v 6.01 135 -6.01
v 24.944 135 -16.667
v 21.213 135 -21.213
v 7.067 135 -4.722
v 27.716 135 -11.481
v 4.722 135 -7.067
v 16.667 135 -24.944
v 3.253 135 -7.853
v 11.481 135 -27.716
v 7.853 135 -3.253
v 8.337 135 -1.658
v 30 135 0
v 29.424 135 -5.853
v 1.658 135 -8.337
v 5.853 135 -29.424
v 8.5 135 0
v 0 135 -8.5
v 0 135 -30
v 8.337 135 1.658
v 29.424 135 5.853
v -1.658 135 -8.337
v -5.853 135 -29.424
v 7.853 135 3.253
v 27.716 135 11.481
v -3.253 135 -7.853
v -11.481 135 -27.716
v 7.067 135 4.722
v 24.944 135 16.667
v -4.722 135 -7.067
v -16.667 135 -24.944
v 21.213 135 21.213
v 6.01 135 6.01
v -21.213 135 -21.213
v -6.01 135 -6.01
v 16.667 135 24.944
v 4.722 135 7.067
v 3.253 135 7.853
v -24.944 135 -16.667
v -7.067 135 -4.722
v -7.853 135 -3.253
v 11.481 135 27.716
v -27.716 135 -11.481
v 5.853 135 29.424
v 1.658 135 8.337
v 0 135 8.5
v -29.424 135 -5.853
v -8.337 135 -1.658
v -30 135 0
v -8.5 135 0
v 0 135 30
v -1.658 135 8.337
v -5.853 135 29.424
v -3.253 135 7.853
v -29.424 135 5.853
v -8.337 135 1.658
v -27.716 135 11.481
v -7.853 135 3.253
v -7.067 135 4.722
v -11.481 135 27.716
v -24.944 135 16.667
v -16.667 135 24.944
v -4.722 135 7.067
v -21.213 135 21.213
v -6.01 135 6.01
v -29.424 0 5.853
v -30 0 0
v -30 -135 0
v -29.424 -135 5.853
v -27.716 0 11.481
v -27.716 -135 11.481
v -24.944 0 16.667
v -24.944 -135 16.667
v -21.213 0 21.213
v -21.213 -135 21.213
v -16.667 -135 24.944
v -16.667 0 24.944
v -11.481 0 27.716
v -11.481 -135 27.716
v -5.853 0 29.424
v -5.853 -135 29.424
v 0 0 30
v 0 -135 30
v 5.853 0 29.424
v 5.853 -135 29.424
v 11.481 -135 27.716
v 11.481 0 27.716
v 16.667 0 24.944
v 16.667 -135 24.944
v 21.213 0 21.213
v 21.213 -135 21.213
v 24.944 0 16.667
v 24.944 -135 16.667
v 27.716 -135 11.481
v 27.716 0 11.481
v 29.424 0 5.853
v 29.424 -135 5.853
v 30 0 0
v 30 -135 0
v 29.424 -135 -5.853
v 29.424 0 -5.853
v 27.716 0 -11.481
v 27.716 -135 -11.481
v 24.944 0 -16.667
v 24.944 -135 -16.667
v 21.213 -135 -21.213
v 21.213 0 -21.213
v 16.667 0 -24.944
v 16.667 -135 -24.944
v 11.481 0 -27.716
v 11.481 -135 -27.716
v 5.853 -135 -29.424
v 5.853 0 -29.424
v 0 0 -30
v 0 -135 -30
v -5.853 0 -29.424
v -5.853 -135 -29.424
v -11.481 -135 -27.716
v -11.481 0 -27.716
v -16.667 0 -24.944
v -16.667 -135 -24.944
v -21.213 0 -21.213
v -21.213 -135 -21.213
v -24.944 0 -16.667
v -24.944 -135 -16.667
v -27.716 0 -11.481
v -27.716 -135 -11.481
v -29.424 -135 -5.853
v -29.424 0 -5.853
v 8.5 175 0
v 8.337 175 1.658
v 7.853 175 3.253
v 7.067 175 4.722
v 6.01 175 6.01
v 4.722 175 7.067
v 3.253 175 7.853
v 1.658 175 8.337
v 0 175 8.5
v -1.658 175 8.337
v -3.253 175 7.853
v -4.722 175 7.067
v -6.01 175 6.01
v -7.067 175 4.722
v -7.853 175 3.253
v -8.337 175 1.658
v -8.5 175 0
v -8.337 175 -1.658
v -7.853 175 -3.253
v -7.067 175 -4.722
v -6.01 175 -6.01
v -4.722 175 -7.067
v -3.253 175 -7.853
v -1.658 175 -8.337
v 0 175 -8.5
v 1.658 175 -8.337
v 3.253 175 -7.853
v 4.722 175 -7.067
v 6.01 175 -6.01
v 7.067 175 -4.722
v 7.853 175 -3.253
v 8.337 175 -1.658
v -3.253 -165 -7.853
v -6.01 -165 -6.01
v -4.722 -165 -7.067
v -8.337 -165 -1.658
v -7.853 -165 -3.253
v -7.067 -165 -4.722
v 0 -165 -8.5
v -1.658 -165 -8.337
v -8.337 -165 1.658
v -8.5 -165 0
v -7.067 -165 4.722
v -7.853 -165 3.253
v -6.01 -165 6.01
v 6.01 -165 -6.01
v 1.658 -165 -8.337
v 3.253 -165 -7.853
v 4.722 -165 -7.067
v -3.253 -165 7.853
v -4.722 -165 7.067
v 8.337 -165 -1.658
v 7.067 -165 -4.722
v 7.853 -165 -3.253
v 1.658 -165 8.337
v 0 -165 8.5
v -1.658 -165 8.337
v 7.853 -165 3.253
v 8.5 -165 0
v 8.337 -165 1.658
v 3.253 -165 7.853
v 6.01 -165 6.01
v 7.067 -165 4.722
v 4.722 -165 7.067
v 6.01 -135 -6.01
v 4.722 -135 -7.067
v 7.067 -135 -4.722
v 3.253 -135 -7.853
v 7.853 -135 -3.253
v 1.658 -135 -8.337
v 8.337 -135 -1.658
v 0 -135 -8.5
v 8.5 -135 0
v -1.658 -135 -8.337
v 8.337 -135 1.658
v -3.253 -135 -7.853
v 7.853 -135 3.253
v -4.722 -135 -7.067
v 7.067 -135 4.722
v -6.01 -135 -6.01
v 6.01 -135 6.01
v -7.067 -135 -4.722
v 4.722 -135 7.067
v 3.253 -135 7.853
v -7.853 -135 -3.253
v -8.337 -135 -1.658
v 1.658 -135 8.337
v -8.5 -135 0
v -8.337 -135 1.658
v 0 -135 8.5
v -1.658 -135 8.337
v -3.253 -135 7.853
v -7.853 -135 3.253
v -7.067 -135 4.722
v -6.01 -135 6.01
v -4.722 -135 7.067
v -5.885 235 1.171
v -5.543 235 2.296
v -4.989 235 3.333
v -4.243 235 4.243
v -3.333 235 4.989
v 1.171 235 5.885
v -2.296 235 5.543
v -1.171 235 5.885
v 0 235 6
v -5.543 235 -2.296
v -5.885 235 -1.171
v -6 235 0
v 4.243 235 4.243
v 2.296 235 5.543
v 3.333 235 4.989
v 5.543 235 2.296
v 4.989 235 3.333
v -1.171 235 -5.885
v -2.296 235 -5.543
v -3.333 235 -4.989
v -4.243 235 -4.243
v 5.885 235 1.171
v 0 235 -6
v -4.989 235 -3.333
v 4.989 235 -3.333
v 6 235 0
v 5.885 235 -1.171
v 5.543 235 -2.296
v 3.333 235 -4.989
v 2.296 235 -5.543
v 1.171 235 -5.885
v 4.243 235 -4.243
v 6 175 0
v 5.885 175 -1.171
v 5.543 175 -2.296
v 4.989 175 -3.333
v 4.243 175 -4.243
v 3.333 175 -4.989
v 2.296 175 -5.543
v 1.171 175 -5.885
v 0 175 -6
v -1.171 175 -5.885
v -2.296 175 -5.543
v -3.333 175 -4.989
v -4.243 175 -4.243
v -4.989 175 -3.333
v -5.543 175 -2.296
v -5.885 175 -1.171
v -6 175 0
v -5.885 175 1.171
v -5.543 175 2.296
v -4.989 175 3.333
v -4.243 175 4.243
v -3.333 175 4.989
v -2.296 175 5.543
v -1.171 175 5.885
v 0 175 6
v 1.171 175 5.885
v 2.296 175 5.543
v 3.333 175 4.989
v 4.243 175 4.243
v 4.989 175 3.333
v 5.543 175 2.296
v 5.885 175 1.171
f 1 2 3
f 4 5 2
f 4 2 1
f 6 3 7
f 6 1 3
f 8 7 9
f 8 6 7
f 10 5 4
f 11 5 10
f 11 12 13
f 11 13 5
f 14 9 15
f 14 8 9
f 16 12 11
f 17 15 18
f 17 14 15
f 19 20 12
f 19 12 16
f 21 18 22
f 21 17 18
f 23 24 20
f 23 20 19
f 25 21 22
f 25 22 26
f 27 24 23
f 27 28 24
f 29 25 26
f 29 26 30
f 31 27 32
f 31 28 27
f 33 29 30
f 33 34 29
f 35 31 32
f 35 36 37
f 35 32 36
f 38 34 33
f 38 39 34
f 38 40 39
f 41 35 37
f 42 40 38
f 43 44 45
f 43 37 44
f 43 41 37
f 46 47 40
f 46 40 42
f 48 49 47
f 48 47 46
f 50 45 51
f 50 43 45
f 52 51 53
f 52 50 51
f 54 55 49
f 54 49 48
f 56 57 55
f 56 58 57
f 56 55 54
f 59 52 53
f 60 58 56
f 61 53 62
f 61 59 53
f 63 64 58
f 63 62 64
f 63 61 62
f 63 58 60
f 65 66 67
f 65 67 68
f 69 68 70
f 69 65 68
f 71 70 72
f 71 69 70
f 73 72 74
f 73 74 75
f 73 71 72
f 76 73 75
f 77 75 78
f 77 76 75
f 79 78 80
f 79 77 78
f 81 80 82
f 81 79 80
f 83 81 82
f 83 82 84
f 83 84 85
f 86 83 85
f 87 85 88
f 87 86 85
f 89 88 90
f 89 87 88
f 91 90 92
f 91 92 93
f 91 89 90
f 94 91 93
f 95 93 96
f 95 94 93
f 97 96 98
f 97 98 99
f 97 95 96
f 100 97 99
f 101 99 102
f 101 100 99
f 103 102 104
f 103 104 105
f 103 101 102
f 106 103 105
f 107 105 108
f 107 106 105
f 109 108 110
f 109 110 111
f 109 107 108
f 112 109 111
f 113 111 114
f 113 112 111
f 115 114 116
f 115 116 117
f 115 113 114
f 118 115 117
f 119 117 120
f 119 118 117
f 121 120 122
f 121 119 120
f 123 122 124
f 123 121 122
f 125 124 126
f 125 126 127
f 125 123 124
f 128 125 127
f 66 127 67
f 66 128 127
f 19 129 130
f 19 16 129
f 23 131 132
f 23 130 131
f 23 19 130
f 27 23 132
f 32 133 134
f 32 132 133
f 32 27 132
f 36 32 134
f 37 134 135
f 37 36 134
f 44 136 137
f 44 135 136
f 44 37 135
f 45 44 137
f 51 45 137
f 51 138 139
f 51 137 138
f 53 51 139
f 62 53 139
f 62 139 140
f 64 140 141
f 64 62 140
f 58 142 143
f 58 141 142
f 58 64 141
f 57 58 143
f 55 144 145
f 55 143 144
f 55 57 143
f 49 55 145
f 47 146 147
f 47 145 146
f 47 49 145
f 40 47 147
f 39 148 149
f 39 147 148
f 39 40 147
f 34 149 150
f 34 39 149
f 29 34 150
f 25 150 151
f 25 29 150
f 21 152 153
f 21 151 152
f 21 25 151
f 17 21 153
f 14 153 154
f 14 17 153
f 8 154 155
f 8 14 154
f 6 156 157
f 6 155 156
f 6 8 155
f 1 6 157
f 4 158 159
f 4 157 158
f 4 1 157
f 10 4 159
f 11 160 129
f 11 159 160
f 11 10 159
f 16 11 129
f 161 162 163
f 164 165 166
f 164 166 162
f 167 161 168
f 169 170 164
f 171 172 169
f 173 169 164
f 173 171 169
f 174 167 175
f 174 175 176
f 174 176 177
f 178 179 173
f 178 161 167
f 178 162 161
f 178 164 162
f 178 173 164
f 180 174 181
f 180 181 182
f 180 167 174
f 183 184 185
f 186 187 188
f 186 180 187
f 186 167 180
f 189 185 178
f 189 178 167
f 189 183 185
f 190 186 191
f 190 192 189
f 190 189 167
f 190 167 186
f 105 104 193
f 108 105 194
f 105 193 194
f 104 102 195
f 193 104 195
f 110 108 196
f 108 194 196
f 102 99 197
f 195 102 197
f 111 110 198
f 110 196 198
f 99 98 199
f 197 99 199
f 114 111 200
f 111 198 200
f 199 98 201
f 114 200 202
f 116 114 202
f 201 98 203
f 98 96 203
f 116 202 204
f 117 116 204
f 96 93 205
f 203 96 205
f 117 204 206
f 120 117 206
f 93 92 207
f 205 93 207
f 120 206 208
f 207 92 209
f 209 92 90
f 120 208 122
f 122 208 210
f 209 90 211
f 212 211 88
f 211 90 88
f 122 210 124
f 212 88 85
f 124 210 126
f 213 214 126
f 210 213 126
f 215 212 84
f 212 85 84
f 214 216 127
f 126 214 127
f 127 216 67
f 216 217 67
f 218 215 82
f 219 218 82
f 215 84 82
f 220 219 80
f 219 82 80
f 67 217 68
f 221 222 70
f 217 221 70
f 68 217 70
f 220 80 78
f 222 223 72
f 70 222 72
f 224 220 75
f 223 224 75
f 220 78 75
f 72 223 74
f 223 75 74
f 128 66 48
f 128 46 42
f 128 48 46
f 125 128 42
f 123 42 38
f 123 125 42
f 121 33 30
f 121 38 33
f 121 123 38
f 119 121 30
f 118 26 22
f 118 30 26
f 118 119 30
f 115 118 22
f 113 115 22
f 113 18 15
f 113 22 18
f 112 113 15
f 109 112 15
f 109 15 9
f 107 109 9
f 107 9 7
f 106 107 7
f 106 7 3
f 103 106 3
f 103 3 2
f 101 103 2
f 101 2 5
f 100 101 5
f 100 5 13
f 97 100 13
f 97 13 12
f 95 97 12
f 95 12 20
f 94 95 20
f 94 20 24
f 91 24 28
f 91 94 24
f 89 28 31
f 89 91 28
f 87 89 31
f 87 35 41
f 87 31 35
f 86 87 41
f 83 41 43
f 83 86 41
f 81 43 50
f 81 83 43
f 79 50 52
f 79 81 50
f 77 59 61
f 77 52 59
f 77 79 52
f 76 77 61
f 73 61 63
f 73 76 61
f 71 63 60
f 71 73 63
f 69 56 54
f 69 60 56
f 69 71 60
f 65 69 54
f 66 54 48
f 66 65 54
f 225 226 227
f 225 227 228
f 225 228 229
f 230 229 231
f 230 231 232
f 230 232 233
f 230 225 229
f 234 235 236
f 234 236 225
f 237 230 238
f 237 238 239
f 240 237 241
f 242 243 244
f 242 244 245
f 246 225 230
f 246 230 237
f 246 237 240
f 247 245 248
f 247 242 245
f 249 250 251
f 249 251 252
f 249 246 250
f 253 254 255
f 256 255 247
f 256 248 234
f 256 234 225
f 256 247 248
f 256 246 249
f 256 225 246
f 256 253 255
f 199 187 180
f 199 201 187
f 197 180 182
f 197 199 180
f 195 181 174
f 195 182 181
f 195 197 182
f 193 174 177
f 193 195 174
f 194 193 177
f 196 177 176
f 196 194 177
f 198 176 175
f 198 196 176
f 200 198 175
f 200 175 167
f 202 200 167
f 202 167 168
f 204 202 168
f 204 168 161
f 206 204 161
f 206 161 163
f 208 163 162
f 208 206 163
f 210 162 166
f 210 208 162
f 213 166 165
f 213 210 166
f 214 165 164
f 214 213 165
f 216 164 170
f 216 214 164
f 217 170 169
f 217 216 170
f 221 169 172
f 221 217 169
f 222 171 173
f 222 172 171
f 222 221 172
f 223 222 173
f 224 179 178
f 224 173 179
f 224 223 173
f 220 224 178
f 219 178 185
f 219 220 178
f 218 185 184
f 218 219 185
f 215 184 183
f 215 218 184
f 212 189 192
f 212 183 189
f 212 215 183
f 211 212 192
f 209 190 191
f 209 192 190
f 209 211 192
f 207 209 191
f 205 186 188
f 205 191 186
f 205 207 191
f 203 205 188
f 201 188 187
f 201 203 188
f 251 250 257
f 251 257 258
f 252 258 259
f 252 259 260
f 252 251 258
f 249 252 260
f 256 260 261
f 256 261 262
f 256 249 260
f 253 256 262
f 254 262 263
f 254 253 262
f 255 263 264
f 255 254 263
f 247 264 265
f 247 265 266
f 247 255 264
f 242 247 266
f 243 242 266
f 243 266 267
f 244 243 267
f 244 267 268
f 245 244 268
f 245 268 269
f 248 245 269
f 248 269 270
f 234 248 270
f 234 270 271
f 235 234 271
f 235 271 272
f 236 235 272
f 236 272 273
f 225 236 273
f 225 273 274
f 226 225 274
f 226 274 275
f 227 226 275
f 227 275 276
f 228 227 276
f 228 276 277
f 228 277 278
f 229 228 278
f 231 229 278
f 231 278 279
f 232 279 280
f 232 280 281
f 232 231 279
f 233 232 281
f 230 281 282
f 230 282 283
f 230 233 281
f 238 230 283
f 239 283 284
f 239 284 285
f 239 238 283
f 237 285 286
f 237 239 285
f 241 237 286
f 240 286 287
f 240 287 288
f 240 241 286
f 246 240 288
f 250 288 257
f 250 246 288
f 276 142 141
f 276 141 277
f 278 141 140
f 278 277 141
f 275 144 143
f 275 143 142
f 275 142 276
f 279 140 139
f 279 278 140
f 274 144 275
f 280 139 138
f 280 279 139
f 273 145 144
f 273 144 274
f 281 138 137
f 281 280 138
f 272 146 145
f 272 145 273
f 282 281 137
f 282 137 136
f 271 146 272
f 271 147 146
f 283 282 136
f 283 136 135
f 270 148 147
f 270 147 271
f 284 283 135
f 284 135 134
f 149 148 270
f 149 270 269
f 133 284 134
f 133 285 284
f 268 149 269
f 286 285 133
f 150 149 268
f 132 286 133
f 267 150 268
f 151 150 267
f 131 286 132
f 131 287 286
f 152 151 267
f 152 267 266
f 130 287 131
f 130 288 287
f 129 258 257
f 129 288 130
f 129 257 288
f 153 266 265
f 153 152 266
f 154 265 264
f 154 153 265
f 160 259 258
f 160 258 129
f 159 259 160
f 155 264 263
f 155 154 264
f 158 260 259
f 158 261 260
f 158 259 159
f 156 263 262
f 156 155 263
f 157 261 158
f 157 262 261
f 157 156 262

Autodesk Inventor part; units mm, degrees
ref_plane "YZ Plane" through (0, 0, 0) normal (1, 0, 0) x (0, 1, 0)
ref_plane "XZ Plane" through (0, 0, 0) normal (0, 1, 0) x (-1, 0, 0)
ref_plane "XY Plane" through (0, 0, 0) normal (0, 0, 1) x (1, 0, 0)
sketch "Sketch1" plane through (0, 0, 0) normal (0, 1, 0) x (-1, 0, 0)
  circle A0 centre (0, 0) radius 30
  dimension "d0" = 60
extrude "Extrusion1" add sketch "Sketch1" along normal mid plane 270
sketch "Sketch2" plane through (0, -135, 0) normal (0, -1, 0) x (1, 0, 0)
  circle A0 centre (0, 0) radius 8.5
  dimension "d3" = 17
extrude "Extrusion2" add sketch "Sketch2" along normal blind 30
sketch "Sketch3" plane through (0, 135, 0) normal (0, 1, 0) x (1, 0, 0)
  circle A0 centre (0, 0) radius 8.5 projected
  circle A1 centre (0, 0) radius 8.5
  dimension "d6" = 17
extrude "Extrusion3" add sketch "Sketch3" along normal blind 100
sketch "Sketch4" plane through (0, 235, 0) normal (0, 1, 0) x (1, 0, 0)
  circle A0 centre (0, 0) radius 8.5 projected
  circle A1 centre (0, 0) radius 6
  dimension "d9" = 12
extrude "Extrusion4" cut sketch "Sketch4" against normal blind 60
properties part number "HCMUTE-CDT23-TRUC_DAN" material "Stainless Steel"
